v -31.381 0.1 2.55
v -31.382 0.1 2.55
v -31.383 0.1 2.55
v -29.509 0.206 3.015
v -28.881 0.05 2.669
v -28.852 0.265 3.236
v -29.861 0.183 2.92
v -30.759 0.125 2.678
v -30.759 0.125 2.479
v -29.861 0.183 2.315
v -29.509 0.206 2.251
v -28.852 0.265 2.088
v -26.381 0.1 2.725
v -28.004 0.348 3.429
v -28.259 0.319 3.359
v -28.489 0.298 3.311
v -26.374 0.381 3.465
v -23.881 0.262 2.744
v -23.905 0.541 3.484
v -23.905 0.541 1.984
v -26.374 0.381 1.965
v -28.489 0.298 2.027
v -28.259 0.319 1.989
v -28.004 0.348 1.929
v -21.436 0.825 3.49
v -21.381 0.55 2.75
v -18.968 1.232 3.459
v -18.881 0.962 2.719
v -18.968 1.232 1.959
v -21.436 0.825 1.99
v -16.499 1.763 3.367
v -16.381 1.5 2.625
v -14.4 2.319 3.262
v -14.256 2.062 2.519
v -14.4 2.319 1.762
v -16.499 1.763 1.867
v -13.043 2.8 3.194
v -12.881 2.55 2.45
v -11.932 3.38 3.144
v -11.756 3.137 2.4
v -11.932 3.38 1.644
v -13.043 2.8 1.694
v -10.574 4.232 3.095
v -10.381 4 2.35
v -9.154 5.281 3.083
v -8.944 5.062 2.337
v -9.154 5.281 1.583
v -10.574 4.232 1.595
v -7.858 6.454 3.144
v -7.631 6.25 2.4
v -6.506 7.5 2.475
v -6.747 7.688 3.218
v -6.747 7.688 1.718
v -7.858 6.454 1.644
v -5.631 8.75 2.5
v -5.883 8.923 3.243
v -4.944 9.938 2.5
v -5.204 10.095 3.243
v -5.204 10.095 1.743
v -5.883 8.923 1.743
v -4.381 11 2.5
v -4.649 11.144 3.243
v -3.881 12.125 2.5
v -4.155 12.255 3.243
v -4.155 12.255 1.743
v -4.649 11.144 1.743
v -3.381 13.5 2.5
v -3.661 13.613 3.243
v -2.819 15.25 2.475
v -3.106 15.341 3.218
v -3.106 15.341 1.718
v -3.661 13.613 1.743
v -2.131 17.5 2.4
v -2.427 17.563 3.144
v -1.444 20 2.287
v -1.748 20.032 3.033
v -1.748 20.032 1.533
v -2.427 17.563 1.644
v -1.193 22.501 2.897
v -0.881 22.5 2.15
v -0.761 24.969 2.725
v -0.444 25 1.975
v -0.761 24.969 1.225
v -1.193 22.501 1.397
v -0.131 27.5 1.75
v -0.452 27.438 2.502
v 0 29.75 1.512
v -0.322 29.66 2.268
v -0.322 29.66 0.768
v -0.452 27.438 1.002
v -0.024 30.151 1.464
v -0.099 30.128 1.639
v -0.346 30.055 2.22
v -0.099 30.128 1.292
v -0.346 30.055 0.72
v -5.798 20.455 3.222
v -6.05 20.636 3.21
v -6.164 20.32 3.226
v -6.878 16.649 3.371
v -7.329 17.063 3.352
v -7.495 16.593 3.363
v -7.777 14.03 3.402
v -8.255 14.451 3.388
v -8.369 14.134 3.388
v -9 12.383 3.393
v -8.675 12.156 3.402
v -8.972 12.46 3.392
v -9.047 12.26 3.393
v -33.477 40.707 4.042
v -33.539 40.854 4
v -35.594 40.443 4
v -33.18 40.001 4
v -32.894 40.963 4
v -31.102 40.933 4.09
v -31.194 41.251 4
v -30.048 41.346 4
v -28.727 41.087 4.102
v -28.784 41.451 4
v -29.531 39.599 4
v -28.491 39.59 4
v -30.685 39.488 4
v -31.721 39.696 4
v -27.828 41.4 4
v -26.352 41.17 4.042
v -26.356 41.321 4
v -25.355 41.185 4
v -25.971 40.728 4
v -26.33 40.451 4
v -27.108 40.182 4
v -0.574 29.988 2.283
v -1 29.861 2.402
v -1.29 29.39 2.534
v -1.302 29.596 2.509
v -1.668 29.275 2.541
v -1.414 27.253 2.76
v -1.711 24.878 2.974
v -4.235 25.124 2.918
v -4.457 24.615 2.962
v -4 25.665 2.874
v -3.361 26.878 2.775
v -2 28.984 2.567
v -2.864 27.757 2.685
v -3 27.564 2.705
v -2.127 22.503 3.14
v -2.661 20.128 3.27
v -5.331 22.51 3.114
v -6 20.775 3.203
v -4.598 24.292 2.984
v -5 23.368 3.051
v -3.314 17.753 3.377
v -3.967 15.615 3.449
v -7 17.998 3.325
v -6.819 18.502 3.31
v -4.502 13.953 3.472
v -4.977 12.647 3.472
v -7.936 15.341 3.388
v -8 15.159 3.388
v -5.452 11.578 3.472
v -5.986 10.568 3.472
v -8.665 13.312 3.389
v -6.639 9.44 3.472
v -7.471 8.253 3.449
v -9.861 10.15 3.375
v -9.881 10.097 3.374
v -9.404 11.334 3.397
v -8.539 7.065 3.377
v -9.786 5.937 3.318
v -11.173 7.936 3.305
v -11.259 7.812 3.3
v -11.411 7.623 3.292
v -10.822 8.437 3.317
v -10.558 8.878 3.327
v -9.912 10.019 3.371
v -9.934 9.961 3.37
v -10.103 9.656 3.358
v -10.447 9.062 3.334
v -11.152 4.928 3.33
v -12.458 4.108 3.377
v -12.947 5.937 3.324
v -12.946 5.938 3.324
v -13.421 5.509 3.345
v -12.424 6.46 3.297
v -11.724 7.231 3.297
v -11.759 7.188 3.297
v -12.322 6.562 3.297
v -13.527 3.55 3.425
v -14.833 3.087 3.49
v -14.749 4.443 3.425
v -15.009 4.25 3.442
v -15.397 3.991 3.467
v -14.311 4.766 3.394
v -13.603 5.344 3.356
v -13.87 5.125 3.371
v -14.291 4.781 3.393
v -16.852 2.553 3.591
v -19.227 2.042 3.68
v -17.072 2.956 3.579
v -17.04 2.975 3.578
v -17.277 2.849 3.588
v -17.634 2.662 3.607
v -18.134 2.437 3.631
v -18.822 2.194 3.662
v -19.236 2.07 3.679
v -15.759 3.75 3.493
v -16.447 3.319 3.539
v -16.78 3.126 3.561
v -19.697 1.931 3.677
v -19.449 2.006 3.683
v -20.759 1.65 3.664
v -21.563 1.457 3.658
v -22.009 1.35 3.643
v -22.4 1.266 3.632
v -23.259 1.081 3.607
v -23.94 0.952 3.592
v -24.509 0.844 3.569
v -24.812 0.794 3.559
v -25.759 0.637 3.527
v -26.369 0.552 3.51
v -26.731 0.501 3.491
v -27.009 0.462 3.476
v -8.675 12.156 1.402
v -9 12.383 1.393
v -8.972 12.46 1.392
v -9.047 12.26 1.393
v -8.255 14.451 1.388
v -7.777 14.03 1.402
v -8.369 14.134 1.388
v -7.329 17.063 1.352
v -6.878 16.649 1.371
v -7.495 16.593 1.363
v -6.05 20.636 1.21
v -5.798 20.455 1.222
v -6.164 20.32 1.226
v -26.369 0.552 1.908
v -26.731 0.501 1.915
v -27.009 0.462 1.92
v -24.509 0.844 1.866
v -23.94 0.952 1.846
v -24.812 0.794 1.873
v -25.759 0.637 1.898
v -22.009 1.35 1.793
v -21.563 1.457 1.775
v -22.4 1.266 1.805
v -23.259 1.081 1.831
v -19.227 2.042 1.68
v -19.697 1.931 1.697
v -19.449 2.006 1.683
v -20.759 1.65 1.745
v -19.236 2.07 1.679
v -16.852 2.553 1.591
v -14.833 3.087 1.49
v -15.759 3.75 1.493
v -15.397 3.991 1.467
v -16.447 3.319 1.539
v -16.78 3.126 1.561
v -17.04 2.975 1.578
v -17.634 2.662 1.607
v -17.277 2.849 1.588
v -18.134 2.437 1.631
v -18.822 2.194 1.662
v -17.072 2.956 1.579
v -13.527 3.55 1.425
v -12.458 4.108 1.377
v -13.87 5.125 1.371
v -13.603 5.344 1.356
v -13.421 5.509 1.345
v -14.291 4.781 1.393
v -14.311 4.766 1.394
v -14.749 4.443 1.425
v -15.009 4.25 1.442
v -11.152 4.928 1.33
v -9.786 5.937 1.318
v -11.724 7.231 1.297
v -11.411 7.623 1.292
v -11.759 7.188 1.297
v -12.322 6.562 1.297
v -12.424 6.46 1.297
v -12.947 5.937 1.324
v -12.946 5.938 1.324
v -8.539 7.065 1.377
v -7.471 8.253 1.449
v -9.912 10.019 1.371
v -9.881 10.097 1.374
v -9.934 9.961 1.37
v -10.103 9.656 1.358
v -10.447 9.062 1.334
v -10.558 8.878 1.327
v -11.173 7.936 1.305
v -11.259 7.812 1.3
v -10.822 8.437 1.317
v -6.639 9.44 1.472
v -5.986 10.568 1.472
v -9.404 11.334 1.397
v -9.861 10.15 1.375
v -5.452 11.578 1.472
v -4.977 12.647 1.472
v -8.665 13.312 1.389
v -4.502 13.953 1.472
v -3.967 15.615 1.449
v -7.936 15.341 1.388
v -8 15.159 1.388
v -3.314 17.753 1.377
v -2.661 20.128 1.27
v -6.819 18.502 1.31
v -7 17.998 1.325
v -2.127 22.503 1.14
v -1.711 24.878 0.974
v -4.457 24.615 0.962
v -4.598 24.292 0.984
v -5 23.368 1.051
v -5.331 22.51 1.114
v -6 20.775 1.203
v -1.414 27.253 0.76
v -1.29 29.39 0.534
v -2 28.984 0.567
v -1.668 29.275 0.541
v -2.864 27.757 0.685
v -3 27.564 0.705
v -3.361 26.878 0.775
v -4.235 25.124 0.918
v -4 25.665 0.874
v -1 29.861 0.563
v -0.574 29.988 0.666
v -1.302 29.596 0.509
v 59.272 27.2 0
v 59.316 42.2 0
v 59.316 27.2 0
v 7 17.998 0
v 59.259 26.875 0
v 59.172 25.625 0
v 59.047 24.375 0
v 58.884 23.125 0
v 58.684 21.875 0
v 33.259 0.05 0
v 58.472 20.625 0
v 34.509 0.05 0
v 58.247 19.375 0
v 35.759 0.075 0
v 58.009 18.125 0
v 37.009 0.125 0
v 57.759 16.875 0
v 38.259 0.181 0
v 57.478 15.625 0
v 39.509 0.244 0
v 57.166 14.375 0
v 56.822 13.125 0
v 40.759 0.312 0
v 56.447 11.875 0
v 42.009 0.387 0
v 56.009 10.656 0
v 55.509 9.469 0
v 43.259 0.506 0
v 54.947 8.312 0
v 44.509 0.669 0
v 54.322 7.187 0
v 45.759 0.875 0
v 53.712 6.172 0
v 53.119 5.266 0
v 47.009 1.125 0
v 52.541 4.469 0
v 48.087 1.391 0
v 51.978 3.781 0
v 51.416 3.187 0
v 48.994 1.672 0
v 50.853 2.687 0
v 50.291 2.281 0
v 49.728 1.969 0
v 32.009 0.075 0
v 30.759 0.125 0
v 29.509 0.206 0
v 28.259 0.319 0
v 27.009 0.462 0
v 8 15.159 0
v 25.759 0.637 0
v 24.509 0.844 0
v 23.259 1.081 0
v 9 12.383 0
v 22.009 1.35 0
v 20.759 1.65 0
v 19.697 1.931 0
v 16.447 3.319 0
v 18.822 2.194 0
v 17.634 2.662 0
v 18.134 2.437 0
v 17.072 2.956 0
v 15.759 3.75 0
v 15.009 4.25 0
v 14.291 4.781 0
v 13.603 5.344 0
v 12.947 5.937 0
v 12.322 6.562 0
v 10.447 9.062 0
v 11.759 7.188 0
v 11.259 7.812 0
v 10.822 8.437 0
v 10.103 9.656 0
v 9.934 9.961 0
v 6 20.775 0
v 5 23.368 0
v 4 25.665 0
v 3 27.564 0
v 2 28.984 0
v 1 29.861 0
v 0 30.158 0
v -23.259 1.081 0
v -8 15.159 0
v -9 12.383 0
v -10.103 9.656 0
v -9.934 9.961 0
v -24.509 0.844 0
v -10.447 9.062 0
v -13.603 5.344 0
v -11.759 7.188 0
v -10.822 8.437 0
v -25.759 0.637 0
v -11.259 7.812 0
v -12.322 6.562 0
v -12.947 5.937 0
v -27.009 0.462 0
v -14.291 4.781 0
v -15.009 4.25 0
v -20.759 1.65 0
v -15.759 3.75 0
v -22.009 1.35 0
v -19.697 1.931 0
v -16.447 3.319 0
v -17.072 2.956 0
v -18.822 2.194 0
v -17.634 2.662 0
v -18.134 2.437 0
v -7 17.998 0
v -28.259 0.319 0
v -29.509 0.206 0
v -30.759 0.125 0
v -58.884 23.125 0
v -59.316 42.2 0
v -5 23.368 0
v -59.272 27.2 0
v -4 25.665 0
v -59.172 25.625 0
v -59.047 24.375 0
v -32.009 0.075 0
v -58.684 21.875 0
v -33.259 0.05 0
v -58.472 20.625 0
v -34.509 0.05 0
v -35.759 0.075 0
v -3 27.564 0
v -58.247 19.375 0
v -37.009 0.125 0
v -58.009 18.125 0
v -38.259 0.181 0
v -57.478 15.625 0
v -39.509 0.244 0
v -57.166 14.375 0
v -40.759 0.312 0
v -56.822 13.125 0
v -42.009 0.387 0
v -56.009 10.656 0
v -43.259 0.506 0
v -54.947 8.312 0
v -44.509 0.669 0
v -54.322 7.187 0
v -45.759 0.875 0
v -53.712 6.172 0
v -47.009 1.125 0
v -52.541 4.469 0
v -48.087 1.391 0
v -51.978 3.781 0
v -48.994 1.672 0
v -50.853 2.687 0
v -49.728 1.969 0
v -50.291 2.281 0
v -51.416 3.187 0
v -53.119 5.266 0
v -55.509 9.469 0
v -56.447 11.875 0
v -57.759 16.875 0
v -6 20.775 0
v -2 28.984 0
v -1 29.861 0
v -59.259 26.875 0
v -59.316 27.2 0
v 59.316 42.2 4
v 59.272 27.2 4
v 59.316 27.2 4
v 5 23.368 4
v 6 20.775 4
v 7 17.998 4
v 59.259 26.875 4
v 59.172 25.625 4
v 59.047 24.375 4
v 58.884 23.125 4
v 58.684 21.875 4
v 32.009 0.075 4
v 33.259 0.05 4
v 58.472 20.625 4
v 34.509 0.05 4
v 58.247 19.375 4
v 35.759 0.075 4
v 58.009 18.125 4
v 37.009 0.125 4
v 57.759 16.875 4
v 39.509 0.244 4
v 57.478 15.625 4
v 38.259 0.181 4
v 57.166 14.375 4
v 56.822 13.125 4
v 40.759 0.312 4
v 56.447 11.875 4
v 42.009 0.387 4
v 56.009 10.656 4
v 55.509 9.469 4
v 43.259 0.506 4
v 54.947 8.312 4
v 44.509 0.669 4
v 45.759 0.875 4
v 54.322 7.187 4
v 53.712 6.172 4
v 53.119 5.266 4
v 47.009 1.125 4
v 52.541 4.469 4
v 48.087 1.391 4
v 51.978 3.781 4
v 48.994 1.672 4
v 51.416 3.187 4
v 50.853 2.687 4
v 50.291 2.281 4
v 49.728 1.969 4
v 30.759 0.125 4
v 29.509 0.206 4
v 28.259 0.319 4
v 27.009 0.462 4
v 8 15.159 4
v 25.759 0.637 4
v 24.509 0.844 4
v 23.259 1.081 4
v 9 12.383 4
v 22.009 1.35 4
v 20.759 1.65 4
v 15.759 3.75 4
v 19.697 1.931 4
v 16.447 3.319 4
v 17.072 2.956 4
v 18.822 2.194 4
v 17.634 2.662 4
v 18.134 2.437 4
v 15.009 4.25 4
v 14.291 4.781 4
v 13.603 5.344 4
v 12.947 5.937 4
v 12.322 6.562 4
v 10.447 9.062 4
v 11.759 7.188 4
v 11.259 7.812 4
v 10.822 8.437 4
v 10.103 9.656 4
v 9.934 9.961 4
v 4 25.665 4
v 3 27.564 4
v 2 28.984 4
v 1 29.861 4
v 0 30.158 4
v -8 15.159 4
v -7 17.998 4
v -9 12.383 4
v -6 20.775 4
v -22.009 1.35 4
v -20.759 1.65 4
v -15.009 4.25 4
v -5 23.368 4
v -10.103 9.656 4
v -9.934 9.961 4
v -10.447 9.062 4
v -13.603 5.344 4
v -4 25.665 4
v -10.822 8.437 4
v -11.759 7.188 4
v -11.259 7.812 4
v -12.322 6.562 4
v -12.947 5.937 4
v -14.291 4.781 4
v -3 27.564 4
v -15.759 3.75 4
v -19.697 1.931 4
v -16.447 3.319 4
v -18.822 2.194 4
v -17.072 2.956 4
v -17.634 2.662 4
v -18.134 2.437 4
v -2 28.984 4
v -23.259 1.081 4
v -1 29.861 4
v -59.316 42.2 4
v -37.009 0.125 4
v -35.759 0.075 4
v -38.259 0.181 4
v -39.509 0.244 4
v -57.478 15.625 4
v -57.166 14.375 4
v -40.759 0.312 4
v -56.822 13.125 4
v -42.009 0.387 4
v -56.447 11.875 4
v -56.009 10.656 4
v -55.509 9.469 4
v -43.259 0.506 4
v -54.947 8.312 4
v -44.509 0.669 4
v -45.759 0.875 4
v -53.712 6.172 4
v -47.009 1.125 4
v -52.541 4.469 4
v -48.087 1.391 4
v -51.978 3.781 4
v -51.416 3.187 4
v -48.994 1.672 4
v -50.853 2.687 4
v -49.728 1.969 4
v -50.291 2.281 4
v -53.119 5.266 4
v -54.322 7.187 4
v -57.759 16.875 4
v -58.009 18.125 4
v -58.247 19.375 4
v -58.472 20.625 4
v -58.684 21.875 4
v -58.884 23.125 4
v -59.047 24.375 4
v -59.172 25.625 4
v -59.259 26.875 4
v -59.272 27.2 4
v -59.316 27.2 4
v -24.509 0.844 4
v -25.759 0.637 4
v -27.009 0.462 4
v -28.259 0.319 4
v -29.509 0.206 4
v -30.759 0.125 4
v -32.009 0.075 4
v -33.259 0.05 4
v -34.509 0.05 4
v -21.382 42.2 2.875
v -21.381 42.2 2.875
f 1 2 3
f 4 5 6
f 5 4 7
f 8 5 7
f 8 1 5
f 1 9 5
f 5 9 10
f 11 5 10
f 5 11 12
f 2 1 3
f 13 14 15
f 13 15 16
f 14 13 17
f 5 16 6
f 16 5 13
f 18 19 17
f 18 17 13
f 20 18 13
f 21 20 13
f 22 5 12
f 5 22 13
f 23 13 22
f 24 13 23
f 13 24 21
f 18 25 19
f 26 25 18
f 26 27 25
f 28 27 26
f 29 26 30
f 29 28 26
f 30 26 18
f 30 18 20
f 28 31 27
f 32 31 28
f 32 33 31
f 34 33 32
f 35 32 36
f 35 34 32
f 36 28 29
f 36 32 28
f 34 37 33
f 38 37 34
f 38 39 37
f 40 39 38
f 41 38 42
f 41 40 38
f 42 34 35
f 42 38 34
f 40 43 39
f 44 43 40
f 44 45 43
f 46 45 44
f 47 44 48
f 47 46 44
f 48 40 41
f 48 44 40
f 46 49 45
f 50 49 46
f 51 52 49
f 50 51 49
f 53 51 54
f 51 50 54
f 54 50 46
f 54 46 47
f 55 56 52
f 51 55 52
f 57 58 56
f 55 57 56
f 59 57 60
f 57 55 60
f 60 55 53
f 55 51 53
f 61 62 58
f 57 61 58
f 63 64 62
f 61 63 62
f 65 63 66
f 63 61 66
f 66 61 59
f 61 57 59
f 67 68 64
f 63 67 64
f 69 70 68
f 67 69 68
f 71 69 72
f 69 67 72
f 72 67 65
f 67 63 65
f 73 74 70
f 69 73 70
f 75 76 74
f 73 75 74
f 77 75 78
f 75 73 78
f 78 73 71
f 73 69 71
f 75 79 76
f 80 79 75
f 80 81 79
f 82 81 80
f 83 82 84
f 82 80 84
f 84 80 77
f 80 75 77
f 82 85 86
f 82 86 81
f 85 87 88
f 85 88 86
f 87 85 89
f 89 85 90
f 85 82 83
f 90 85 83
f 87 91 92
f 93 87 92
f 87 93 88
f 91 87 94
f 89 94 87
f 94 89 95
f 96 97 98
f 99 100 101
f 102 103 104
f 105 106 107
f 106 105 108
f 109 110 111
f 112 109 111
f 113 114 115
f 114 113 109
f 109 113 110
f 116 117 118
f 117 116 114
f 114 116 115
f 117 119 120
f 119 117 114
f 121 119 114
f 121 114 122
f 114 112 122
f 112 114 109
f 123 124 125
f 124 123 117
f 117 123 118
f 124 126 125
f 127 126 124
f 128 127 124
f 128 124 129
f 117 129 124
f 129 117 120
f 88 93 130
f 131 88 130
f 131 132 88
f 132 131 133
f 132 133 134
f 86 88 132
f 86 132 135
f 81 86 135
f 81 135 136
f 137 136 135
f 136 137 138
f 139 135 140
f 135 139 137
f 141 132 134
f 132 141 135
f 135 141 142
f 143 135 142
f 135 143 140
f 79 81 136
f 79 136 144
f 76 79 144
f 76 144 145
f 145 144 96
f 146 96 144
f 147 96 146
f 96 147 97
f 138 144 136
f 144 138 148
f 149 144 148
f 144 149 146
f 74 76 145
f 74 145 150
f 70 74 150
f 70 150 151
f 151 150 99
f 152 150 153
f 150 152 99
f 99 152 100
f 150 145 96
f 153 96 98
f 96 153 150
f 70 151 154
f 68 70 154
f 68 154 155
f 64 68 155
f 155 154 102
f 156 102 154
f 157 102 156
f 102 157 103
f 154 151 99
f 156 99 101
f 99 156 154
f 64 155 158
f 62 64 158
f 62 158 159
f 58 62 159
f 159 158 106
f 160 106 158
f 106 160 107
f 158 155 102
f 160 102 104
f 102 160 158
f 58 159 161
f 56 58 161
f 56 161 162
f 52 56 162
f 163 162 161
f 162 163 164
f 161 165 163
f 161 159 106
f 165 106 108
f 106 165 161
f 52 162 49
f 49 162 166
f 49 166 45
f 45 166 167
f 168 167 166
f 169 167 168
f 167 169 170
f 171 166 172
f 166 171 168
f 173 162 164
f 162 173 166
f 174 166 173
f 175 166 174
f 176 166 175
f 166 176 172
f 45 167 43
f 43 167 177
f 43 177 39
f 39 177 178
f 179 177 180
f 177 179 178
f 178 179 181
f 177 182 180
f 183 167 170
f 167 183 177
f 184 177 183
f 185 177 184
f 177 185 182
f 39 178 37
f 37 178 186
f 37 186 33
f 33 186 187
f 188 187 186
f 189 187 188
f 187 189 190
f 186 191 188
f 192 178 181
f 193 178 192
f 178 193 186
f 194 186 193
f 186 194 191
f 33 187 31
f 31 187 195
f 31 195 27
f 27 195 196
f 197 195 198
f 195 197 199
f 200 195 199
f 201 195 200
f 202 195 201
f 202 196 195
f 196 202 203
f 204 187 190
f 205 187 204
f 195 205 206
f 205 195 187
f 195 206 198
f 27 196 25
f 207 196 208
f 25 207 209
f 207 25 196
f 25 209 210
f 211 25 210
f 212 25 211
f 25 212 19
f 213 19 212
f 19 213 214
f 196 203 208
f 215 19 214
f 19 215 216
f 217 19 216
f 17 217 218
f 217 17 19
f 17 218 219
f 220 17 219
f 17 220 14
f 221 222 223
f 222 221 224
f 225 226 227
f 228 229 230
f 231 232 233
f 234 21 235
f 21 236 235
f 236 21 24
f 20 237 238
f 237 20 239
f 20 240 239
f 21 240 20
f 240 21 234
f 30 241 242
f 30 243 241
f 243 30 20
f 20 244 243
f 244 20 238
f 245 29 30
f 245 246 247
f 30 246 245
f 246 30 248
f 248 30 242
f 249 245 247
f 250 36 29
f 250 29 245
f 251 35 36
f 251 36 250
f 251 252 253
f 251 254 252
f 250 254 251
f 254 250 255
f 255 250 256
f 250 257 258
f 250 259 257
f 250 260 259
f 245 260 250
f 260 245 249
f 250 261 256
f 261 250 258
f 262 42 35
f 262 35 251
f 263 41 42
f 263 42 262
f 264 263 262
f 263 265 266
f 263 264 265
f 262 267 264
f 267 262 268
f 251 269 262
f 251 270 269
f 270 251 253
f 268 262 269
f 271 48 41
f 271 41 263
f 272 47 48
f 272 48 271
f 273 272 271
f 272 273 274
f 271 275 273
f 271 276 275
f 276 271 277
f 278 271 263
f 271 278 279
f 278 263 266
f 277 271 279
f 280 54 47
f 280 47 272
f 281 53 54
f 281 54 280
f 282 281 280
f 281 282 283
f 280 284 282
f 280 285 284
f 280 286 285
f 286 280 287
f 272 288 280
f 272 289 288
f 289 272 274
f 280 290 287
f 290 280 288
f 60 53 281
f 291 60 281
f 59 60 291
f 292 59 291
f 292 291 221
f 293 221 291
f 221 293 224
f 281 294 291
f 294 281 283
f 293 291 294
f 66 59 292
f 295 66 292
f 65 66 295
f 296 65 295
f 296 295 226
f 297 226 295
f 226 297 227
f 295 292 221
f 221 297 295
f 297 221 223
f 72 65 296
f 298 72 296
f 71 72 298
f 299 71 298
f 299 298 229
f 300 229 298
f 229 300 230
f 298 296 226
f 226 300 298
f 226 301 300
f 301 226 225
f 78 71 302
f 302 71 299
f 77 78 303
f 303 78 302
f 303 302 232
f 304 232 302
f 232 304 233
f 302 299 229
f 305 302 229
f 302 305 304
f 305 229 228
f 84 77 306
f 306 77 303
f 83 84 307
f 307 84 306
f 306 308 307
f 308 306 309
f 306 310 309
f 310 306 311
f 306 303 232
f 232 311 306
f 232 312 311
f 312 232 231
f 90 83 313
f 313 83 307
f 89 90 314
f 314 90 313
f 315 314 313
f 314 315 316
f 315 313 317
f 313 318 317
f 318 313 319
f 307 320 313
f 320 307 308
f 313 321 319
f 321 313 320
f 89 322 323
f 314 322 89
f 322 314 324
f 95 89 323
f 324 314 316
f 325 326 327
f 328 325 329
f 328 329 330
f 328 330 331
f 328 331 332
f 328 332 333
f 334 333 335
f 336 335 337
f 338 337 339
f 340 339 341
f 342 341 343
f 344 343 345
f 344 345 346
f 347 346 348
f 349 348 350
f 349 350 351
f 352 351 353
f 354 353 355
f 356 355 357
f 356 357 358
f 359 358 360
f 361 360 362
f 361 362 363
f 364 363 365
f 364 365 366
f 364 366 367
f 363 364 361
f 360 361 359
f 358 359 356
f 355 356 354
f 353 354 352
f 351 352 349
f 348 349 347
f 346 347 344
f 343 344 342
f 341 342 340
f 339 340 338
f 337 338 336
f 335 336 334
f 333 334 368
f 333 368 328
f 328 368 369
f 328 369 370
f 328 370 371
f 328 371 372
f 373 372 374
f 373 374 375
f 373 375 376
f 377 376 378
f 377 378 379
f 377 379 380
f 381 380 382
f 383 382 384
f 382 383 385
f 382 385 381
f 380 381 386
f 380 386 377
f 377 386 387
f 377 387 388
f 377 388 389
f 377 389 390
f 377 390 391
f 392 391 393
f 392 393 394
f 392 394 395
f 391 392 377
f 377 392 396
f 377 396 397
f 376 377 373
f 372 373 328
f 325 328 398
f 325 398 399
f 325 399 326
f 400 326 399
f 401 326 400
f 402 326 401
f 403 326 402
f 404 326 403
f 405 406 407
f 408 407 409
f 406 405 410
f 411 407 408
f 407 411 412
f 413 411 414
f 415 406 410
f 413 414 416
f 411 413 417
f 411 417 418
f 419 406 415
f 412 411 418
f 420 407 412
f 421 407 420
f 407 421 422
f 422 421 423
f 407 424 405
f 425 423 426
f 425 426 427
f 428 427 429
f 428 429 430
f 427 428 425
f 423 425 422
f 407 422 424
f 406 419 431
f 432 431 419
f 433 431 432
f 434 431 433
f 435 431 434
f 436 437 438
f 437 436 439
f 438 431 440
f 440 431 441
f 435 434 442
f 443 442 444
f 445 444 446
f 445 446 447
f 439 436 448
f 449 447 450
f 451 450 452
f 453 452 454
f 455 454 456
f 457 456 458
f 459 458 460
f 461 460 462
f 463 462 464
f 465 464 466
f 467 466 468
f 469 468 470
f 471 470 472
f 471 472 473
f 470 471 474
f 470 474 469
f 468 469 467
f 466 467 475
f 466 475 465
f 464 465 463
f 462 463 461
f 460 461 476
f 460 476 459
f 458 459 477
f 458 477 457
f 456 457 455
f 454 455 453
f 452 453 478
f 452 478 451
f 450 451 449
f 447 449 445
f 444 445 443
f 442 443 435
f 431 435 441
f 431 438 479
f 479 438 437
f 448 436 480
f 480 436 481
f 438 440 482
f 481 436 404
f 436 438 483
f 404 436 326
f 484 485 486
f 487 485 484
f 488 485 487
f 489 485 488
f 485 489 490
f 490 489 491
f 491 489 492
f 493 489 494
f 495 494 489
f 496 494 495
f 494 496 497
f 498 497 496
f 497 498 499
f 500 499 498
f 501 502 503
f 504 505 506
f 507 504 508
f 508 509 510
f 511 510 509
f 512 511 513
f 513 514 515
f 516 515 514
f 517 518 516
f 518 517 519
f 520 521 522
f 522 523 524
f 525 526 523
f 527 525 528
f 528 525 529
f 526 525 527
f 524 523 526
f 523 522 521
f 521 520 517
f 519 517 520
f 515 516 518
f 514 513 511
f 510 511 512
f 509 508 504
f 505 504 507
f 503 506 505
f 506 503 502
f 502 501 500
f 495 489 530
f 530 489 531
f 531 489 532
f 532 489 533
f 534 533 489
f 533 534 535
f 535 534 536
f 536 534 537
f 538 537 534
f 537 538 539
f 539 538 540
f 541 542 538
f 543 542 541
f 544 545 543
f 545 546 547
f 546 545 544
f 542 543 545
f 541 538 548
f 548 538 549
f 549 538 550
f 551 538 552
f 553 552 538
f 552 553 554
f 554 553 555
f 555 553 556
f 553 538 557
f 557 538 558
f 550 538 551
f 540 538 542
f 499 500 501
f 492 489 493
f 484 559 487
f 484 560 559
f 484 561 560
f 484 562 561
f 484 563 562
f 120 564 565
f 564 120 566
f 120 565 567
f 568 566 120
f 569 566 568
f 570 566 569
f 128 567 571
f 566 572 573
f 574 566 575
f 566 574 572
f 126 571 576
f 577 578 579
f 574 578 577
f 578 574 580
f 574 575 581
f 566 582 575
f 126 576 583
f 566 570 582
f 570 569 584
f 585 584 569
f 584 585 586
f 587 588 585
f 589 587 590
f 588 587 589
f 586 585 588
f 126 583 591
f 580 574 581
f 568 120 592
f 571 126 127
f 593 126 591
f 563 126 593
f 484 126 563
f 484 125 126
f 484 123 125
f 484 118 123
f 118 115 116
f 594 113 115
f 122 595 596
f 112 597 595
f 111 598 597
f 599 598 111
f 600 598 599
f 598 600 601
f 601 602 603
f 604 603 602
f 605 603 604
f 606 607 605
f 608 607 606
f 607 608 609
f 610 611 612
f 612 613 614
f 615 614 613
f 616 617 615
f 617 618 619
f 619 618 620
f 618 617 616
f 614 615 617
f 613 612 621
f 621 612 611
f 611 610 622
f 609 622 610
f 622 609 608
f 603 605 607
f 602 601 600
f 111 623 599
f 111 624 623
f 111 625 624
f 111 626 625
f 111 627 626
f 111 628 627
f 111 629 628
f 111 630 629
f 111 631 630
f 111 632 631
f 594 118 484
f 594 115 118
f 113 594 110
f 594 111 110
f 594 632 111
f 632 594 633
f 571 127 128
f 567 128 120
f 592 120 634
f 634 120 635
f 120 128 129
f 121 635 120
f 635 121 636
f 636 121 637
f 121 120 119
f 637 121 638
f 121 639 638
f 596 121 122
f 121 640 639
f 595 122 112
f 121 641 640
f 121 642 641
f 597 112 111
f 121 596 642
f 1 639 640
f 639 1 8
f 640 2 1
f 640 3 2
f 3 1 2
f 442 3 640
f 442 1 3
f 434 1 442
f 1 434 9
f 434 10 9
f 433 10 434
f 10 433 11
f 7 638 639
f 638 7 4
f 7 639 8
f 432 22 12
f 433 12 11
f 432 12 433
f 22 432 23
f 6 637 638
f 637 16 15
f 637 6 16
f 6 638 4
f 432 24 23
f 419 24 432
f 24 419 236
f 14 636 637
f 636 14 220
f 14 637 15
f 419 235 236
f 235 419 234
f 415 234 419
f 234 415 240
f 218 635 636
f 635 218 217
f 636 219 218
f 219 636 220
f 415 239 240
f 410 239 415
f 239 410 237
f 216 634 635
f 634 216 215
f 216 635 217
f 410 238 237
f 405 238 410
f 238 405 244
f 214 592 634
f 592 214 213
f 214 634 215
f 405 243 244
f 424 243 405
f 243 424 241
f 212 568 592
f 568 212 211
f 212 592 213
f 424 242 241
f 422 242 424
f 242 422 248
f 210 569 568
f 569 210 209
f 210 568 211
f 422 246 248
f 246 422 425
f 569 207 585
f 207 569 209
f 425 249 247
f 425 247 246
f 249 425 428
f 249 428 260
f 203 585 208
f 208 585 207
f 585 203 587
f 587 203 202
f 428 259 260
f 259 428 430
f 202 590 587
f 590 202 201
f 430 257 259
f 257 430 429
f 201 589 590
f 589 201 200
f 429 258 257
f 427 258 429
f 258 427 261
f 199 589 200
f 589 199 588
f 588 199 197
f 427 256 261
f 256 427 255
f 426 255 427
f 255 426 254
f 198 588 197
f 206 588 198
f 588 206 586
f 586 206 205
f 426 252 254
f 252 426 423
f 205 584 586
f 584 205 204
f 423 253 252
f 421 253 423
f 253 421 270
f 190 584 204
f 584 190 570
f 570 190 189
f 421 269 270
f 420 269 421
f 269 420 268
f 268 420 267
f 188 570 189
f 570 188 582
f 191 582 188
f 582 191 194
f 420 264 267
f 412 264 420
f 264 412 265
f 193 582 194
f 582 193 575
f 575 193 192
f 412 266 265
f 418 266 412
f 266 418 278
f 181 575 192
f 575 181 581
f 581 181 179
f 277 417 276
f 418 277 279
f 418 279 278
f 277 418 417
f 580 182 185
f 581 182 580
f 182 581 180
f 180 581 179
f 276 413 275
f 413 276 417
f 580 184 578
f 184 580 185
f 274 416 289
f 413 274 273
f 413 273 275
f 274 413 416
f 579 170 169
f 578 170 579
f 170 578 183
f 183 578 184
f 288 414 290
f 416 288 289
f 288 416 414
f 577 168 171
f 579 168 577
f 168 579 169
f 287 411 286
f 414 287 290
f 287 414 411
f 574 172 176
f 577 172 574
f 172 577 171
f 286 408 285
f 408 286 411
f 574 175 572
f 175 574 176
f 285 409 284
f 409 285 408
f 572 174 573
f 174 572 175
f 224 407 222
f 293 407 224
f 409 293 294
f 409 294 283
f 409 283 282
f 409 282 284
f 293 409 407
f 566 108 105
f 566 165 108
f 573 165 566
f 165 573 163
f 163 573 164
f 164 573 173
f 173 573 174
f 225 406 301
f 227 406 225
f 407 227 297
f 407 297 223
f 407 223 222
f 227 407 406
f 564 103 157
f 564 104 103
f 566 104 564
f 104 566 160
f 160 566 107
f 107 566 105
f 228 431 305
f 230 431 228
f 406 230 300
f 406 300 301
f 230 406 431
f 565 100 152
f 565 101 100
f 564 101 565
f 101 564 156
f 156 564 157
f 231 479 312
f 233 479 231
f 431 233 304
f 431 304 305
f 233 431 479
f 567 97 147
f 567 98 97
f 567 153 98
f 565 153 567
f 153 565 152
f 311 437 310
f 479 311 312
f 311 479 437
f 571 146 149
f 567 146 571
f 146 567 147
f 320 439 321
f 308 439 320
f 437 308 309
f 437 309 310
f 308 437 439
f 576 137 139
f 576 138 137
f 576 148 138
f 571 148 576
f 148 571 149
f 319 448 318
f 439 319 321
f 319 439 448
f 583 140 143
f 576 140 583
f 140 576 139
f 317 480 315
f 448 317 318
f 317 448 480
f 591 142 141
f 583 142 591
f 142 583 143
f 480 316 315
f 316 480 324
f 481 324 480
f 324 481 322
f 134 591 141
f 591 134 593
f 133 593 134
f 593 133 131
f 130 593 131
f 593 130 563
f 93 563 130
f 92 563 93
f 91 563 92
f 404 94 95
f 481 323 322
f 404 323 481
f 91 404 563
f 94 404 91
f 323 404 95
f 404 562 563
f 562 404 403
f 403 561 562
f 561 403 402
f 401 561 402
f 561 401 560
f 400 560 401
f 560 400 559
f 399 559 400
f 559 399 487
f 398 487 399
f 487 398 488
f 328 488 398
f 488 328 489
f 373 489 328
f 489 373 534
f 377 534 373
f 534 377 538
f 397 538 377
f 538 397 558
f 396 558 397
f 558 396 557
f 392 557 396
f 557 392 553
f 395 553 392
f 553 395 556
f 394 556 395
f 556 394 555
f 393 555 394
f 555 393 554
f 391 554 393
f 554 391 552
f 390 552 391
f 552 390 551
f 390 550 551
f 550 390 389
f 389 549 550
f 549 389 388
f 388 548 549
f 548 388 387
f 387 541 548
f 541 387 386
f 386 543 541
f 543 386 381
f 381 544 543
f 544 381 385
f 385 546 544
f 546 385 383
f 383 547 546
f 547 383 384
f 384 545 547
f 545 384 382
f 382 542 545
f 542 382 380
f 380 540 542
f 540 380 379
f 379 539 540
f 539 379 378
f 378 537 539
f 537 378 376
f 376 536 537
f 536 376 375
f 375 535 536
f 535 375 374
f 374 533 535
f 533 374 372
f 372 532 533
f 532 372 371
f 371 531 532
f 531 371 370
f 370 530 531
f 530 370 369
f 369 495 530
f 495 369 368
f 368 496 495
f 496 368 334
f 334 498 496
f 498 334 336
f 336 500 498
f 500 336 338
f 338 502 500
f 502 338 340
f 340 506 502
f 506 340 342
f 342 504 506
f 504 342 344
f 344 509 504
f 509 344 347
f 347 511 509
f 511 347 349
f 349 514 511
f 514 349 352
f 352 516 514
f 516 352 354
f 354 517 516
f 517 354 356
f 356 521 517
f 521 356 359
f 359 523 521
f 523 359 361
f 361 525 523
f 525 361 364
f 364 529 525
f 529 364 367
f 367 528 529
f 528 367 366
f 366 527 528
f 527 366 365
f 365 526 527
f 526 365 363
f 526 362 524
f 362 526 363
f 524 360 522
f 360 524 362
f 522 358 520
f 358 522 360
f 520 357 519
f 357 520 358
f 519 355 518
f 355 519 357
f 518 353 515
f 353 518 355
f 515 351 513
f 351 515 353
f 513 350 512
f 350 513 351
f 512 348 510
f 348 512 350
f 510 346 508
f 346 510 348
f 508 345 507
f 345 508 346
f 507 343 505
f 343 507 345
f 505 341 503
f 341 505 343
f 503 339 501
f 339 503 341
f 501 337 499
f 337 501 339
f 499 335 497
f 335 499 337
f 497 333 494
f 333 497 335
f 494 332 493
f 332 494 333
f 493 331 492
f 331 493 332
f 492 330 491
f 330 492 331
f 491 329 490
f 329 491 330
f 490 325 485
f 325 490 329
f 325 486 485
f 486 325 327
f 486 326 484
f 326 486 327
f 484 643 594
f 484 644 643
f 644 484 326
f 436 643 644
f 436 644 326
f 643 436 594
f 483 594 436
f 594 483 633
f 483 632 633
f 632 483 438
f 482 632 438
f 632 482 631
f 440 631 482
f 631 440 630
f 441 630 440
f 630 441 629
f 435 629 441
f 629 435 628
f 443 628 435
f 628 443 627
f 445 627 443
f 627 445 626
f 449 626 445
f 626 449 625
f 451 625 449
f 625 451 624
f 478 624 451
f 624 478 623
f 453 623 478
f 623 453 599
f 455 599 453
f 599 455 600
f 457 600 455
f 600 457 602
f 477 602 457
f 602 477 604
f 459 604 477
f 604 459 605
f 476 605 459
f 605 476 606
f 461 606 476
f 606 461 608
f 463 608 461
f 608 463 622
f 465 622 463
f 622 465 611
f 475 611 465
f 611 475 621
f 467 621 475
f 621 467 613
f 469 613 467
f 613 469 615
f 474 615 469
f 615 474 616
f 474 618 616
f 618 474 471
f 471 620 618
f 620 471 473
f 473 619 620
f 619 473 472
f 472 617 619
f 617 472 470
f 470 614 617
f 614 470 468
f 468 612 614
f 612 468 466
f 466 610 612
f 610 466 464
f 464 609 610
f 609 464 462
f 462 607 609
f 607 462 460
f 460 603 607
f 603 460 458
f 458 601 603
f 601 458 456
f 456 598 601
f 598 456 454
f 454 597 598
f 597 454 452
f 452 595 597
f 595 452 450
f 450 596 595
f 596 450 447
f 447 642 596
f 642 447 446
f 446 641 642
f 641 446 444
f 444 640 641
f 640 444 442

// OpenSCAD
// file: bridge_curve.scad
module bridge_curve(){
    polygon(
        points=[
            [-3.1415926536, 0.0000000000],
            [-2.9321531434, 0.0218523993],
            [-2.7227136331, 0.0864545424],
            [-2.5132741229, 0.1909830056],
            [-2.3038346126, 0.3308693936],
            [-2.0943951024, 0.5000000000],
            [-1.8849555922, 0.6909830056],
            [-1.6755160819, 0.8954715367],
            [-1.4660765717, 1.1045284633],
            [-1.2566370614, 1.3090169944],
            [-1.0471975512, 1.5000000000],
            [-0.8377580410, 1.6691306064],
            [-0.6283185307, 1.8090169944],
            [-0.4188790205, 1.9135454576],
            [-0.2094395102, 1.9781476007],
            [0.0000000000, 2.0000000000],
            [0.2094395102, 1.9781476007],
            [0.4188790205, 1.9135454576],
            [0.6283185307, 1.8090169944],
            [0.8377580410, 1.6691306064],
            [1.0471975512, 1.5000000000],
            [1.2566370614, 1.3090169944],
            [1.4660765717, 1.1045284633],
            [1.6755160819, 0.8954715367],
            [1.8849555922, 0.6909830056],
            [2.0943951024, 0.5000000000],
            [2.3038346126, 0.3308693936],
            [2.5132741229, 0.1909830056],
            [2.7227136331, 0.0864545424],
            [2.9321531434, 0.0218523993],
            [3.1415926536, 0.0000000000],
        ]
);
}
bridge_curve_min = [-3.1415926536, 0.0000000000, 0.0000000000];
bridge_curve_max = [3.1415926536, 2.0000000000, 0.0000000000];
// file: flattened_glasses_shape.scad
module flattened_glasses_shape(){
    polygon(
        points=[
            [-53.8843754789, 23.1250018780],
            [-53.6843748779, 21.8749981220],
            [-53.4718752160, 20.6250000000],
            [-53.2468752160, 19.3750000000],
            [-53.0093755540, 18.1250018780],
            [-52.7593748028, 16.8749981220],
            [-52.4781252723, 15.6250000000],
            [-52.1656252723, 14.3750000000],
            [-51.8218757418, 13.1250018780],
            [-51.4468746150, 11.8749981220],
            [-51.0093753662, 10.6562499061],
            [-50.5093753662, 9.4687499061],
            [-49.9468761174, 8.3125016902],
            [-49.3218742394, 7.1874983098],
            [-48.7125001315, 6.1718746713],
            [-48.1187501315, 5.2656246713],
            [-47.5406260235, 4.4687510329],
            [-46.9781243333, 3.7812489671],
            [-46.4156251784, 3.1874997183],
            [-45.8531251784, 2.6874997183],
            [-45.2906260235, 2.2812504695],
            [-44.7281243333, 1.9687495305],
            [-43.9937506949, 1.6718749530],
            [-43.0875006949, 1.3906249530],
            [-42.0093770564, 1.1250003756],
            [-40.7593733004, 0.8749996244],
            [-39.5093751784, 0.6687498685],
            [-38.2593751784, 0.5062498685],
            [-37.0093770564, 0.3875001127],
            [-35.7593733004, 0.3124998873],
            [-34.5093751784, 0.2437499812],
            [-33.2593751784, 0.1812499812],
            [-32.0093770564, 0.1250000751],
            [-30.7593733004, 0.0749999249],
            [-29.5093751784, 0.0499999249],
            [-28.2593751784, 0.0499999249],
            [-27.0093770564, 0.0749999249],
            [-25.7593733004, 0.1250000751],
            [-24.5093751784, 0.2062499061],
            [-23.2593751784, 0.3187499061],
            [-22.0093770564, 0.4624997371],
            [-20.7593733004, 0.6375002629],
            [-19.5093751784, 0.8437499061],
            [-18.2593751784, 1.0812499061],
            [-17.0093770564, 1.3499995493],
            [-15.7593733004, 1.6500004507],
            [-14.6968746150, 1.9312500563],
            [-13.8218746150, 2.1937500563],
            [-13.1343759296, 2.4374996620],
            [-12.6343744272, 2.6625003380],
            [-12.0718753662, 2.9562497934],
            [-11.4468753662, 3.3187497934],
            [-10.7593763052, 3.7499992488],
            [-10.0093740516, 4.2500007512],
            [-9.2906250845, 4.7812499061],
            [-8.6031250845, 5.3437499061],
            [-7.9468761174, 5.9374990610],
            [-7.3218742394, 6.5625009390],
            [-6.7593749906, 7.1875000000],
            [-6.2593749906, 7.8125000000],
            [-5.8218757418, 8.4374990610],
            [-5.4468746150, 9.0625009390],
            [-5.1031250845, 9.6562500939],
            [-4.7906250845, 10.2187500939],
            [-4.5093755540, 10.7499992488],
            [-4.2593748028, 11.2500007512],
            [-4.0093751784, 11.8124998122],
            [-3.7593751784, 12.4374998122],
            [-3.5093755540, 13.1249988732],
            [-3.2593748028, 13.8750011268],
            [-2.9781252723, 14.7499996244],
            [-2.6656252723, 15.7499996244],
            [-2.3218757418, 16.8749981220],
            [-1.9468746150, 18.1250018780],
            [-1.6031250845, 19.3750000000],
            [-1.2906250845, 20.6250000000],
            [-1.0093755540, 21.8749981220],
            [-0.7593748028, 23.1250018780],
            [-0.5406250845, 24.3750000000],
            [-0.3531250845, 25.6250000000],
            [-0.1968753662, 26.8749981220],
            [-0.0718749906, 28.1250018780],
            [-0.0062500000, 29.2500003756],
            [0.0000000000, 30.2500003756],
            [-0.0531250094, 31.1249988732],
            [-0.1656253474, 31.8750011268],
            [-0.2843751596, 32.5625001878],
            [-0.4093751596, 33.1875001878],
            [-0.5406249718, 33.7499992488],
            [-0.6781253850, 34.2500007512],
            [-0.8437500939, 34.7812499061],
            [-1.0375000939, 35.3437499061],
            [-1.2593748028, 35.9374990610],
            [-1.5093755540, 36.5625009390],
            [-1.8218749906, 37.1250001878],
            [-2.1968749906, 37.6250001878],
            [-2.6343744272, 38.0624994366],
            [-3.1343759296, 38.4375005634],
            [-3.6031252723, 38.7812500939],
            [-4.0406252723, 39.0937500939],
            [-4.4468746150, 39.3749996244],
            [-4.8218757418, 39.6250003756],
            [-5.3218748028, 39.9062499061],
            [-5.9468748028, 40.2187499061],
            [-6.6968738638, 40.5624994366],
            [-7.5718764930, 40.9375005634],
            [-8.5406248967, 41.2500001878],
            [-9.6031248967, 41.5000001878],
            [-10.7593733004, 41.6874998122],
            [-12.0093770564, 41.8125001878],
            [-13.2593751784, 41.9187500563],
            [-14.5093751784, 42.0062500563],
            [-15.7593733004, 42.0749999249],
            [-17.0093770564, 42.1250000751],
            [-18.2593751784, 42.1625000376],
            [-19.5093751784, 42.1875000376],
            [-20.7593733004, 42.2000000000],
            [-22.0093770564, 42.2000000000],
            [-23.2593751784, 42.1937500188],
            [-24.5093751784, 42.1812500188],
            [-25.7593733004, 42.1625000376],
            [-27.0093770564, 42.1374999624],
            [-28.2593751784, 42.0937500563],
            [-29.5093751784, 42.0312500563],
            [-30.7593733004, 41.9500001502],
            [-32.0093770564, 41.8499998498],
            [-33.2593751784, 41.7312500563],
            [-34.5093751784, 41.5937500563],
            [-35.7593733004, 41.4375002629],
            [-37.0093770564, 41.2624997371],
            [-38.2593751784, 41.0812500188],
            [-39.5093751784, 40.8937500188],
            [-40.7593733004, 40.7000003005],
            [-42.0093770564, 40.4999996995],
            [-43.2593751784, 40.2437501690],
            [-44.5093751784, 39.9312501690],
            [-45.7593733004, 39.5625006385],
            [-47.0093770564, 39.1374993615],
            [-48.0406258357, 38.7562498685],
            [-48.8531258357, 38.4187498685],
            [-49.4468746150, 38.1250003756],
            [-49.8218757418, 37.8749996244],
            [-50.2593749906, 37.5312502817],
            [-50.7593749906, 37.0937502817],
            [-51.3218742394, 36.5625009390],
            [-51.9468761174, 35.9374990610],
            [-52.4781254601, 35.3281249530],
            [-52.9156254601, 34.7343749530],
            [-53.2593748028, 34.1562508451],
            [-53.5093755540, 33.5937491549],
            [-53.7281252723, 33.0000000939],
            [-53.9156252723, 32.3750000939],
            [-54.0718749906, 31.7187510329],
            [-54.1968753662, 31.0312489671],
            [-54.2781253099, 30.2031254226],
            [-54.3156253099, 29.2343754226],
            [-54.3093752535, 28.1250018780],
            [-54.2593751033, 26.8749981220],
            [-54.1718752911, 25.6250000000],
            [-54.0468752911, 24.3750000000],
        ]
);
}
flattened_glasses_shape_min = [-54.3156253099, 0.0499999249, 0.0000000000];
flattened_glasses_shape_max = [0.0000000000, 42.2000000000, 0.0000000000];
// main file
include <extruded_glasses_shape.scad>
include <flattened_glasses_shape.scad>
include <bridge_curve.scad>

sep = 10;
frame_scaleup = 1.2;
lens_width = flattened_glasses_shape_max[0] - flattened_glasses_shape_min[0];

brow_thick = 15;
lens_thick = 4;

extruded_glasses_shape();

linear_extrude(lens_thick)
difference() {
    union() {
        mirror([1, 0]) 
        translate([-sep*.5, 0, 0])
        flattened_glasses_shape();

        translate([-sep*.5, 0, 0])
        flattened_glasses_shape();
        
        translate([0, -(brow_thick/2)+flattened_glasses_shape_max[1]]) 
        square([sep+(lens_width*2), brow_thick], center=true);

        translate([0, -(brow_thick)+flattened_glasses_shape_max[1]]) 
        square([sep+lens_width, brow_thick*2], center=true);
    }

    translate([0, 3]) 
    resize([sep+20, lens_width/2]) 
    bridge_curve();

}
